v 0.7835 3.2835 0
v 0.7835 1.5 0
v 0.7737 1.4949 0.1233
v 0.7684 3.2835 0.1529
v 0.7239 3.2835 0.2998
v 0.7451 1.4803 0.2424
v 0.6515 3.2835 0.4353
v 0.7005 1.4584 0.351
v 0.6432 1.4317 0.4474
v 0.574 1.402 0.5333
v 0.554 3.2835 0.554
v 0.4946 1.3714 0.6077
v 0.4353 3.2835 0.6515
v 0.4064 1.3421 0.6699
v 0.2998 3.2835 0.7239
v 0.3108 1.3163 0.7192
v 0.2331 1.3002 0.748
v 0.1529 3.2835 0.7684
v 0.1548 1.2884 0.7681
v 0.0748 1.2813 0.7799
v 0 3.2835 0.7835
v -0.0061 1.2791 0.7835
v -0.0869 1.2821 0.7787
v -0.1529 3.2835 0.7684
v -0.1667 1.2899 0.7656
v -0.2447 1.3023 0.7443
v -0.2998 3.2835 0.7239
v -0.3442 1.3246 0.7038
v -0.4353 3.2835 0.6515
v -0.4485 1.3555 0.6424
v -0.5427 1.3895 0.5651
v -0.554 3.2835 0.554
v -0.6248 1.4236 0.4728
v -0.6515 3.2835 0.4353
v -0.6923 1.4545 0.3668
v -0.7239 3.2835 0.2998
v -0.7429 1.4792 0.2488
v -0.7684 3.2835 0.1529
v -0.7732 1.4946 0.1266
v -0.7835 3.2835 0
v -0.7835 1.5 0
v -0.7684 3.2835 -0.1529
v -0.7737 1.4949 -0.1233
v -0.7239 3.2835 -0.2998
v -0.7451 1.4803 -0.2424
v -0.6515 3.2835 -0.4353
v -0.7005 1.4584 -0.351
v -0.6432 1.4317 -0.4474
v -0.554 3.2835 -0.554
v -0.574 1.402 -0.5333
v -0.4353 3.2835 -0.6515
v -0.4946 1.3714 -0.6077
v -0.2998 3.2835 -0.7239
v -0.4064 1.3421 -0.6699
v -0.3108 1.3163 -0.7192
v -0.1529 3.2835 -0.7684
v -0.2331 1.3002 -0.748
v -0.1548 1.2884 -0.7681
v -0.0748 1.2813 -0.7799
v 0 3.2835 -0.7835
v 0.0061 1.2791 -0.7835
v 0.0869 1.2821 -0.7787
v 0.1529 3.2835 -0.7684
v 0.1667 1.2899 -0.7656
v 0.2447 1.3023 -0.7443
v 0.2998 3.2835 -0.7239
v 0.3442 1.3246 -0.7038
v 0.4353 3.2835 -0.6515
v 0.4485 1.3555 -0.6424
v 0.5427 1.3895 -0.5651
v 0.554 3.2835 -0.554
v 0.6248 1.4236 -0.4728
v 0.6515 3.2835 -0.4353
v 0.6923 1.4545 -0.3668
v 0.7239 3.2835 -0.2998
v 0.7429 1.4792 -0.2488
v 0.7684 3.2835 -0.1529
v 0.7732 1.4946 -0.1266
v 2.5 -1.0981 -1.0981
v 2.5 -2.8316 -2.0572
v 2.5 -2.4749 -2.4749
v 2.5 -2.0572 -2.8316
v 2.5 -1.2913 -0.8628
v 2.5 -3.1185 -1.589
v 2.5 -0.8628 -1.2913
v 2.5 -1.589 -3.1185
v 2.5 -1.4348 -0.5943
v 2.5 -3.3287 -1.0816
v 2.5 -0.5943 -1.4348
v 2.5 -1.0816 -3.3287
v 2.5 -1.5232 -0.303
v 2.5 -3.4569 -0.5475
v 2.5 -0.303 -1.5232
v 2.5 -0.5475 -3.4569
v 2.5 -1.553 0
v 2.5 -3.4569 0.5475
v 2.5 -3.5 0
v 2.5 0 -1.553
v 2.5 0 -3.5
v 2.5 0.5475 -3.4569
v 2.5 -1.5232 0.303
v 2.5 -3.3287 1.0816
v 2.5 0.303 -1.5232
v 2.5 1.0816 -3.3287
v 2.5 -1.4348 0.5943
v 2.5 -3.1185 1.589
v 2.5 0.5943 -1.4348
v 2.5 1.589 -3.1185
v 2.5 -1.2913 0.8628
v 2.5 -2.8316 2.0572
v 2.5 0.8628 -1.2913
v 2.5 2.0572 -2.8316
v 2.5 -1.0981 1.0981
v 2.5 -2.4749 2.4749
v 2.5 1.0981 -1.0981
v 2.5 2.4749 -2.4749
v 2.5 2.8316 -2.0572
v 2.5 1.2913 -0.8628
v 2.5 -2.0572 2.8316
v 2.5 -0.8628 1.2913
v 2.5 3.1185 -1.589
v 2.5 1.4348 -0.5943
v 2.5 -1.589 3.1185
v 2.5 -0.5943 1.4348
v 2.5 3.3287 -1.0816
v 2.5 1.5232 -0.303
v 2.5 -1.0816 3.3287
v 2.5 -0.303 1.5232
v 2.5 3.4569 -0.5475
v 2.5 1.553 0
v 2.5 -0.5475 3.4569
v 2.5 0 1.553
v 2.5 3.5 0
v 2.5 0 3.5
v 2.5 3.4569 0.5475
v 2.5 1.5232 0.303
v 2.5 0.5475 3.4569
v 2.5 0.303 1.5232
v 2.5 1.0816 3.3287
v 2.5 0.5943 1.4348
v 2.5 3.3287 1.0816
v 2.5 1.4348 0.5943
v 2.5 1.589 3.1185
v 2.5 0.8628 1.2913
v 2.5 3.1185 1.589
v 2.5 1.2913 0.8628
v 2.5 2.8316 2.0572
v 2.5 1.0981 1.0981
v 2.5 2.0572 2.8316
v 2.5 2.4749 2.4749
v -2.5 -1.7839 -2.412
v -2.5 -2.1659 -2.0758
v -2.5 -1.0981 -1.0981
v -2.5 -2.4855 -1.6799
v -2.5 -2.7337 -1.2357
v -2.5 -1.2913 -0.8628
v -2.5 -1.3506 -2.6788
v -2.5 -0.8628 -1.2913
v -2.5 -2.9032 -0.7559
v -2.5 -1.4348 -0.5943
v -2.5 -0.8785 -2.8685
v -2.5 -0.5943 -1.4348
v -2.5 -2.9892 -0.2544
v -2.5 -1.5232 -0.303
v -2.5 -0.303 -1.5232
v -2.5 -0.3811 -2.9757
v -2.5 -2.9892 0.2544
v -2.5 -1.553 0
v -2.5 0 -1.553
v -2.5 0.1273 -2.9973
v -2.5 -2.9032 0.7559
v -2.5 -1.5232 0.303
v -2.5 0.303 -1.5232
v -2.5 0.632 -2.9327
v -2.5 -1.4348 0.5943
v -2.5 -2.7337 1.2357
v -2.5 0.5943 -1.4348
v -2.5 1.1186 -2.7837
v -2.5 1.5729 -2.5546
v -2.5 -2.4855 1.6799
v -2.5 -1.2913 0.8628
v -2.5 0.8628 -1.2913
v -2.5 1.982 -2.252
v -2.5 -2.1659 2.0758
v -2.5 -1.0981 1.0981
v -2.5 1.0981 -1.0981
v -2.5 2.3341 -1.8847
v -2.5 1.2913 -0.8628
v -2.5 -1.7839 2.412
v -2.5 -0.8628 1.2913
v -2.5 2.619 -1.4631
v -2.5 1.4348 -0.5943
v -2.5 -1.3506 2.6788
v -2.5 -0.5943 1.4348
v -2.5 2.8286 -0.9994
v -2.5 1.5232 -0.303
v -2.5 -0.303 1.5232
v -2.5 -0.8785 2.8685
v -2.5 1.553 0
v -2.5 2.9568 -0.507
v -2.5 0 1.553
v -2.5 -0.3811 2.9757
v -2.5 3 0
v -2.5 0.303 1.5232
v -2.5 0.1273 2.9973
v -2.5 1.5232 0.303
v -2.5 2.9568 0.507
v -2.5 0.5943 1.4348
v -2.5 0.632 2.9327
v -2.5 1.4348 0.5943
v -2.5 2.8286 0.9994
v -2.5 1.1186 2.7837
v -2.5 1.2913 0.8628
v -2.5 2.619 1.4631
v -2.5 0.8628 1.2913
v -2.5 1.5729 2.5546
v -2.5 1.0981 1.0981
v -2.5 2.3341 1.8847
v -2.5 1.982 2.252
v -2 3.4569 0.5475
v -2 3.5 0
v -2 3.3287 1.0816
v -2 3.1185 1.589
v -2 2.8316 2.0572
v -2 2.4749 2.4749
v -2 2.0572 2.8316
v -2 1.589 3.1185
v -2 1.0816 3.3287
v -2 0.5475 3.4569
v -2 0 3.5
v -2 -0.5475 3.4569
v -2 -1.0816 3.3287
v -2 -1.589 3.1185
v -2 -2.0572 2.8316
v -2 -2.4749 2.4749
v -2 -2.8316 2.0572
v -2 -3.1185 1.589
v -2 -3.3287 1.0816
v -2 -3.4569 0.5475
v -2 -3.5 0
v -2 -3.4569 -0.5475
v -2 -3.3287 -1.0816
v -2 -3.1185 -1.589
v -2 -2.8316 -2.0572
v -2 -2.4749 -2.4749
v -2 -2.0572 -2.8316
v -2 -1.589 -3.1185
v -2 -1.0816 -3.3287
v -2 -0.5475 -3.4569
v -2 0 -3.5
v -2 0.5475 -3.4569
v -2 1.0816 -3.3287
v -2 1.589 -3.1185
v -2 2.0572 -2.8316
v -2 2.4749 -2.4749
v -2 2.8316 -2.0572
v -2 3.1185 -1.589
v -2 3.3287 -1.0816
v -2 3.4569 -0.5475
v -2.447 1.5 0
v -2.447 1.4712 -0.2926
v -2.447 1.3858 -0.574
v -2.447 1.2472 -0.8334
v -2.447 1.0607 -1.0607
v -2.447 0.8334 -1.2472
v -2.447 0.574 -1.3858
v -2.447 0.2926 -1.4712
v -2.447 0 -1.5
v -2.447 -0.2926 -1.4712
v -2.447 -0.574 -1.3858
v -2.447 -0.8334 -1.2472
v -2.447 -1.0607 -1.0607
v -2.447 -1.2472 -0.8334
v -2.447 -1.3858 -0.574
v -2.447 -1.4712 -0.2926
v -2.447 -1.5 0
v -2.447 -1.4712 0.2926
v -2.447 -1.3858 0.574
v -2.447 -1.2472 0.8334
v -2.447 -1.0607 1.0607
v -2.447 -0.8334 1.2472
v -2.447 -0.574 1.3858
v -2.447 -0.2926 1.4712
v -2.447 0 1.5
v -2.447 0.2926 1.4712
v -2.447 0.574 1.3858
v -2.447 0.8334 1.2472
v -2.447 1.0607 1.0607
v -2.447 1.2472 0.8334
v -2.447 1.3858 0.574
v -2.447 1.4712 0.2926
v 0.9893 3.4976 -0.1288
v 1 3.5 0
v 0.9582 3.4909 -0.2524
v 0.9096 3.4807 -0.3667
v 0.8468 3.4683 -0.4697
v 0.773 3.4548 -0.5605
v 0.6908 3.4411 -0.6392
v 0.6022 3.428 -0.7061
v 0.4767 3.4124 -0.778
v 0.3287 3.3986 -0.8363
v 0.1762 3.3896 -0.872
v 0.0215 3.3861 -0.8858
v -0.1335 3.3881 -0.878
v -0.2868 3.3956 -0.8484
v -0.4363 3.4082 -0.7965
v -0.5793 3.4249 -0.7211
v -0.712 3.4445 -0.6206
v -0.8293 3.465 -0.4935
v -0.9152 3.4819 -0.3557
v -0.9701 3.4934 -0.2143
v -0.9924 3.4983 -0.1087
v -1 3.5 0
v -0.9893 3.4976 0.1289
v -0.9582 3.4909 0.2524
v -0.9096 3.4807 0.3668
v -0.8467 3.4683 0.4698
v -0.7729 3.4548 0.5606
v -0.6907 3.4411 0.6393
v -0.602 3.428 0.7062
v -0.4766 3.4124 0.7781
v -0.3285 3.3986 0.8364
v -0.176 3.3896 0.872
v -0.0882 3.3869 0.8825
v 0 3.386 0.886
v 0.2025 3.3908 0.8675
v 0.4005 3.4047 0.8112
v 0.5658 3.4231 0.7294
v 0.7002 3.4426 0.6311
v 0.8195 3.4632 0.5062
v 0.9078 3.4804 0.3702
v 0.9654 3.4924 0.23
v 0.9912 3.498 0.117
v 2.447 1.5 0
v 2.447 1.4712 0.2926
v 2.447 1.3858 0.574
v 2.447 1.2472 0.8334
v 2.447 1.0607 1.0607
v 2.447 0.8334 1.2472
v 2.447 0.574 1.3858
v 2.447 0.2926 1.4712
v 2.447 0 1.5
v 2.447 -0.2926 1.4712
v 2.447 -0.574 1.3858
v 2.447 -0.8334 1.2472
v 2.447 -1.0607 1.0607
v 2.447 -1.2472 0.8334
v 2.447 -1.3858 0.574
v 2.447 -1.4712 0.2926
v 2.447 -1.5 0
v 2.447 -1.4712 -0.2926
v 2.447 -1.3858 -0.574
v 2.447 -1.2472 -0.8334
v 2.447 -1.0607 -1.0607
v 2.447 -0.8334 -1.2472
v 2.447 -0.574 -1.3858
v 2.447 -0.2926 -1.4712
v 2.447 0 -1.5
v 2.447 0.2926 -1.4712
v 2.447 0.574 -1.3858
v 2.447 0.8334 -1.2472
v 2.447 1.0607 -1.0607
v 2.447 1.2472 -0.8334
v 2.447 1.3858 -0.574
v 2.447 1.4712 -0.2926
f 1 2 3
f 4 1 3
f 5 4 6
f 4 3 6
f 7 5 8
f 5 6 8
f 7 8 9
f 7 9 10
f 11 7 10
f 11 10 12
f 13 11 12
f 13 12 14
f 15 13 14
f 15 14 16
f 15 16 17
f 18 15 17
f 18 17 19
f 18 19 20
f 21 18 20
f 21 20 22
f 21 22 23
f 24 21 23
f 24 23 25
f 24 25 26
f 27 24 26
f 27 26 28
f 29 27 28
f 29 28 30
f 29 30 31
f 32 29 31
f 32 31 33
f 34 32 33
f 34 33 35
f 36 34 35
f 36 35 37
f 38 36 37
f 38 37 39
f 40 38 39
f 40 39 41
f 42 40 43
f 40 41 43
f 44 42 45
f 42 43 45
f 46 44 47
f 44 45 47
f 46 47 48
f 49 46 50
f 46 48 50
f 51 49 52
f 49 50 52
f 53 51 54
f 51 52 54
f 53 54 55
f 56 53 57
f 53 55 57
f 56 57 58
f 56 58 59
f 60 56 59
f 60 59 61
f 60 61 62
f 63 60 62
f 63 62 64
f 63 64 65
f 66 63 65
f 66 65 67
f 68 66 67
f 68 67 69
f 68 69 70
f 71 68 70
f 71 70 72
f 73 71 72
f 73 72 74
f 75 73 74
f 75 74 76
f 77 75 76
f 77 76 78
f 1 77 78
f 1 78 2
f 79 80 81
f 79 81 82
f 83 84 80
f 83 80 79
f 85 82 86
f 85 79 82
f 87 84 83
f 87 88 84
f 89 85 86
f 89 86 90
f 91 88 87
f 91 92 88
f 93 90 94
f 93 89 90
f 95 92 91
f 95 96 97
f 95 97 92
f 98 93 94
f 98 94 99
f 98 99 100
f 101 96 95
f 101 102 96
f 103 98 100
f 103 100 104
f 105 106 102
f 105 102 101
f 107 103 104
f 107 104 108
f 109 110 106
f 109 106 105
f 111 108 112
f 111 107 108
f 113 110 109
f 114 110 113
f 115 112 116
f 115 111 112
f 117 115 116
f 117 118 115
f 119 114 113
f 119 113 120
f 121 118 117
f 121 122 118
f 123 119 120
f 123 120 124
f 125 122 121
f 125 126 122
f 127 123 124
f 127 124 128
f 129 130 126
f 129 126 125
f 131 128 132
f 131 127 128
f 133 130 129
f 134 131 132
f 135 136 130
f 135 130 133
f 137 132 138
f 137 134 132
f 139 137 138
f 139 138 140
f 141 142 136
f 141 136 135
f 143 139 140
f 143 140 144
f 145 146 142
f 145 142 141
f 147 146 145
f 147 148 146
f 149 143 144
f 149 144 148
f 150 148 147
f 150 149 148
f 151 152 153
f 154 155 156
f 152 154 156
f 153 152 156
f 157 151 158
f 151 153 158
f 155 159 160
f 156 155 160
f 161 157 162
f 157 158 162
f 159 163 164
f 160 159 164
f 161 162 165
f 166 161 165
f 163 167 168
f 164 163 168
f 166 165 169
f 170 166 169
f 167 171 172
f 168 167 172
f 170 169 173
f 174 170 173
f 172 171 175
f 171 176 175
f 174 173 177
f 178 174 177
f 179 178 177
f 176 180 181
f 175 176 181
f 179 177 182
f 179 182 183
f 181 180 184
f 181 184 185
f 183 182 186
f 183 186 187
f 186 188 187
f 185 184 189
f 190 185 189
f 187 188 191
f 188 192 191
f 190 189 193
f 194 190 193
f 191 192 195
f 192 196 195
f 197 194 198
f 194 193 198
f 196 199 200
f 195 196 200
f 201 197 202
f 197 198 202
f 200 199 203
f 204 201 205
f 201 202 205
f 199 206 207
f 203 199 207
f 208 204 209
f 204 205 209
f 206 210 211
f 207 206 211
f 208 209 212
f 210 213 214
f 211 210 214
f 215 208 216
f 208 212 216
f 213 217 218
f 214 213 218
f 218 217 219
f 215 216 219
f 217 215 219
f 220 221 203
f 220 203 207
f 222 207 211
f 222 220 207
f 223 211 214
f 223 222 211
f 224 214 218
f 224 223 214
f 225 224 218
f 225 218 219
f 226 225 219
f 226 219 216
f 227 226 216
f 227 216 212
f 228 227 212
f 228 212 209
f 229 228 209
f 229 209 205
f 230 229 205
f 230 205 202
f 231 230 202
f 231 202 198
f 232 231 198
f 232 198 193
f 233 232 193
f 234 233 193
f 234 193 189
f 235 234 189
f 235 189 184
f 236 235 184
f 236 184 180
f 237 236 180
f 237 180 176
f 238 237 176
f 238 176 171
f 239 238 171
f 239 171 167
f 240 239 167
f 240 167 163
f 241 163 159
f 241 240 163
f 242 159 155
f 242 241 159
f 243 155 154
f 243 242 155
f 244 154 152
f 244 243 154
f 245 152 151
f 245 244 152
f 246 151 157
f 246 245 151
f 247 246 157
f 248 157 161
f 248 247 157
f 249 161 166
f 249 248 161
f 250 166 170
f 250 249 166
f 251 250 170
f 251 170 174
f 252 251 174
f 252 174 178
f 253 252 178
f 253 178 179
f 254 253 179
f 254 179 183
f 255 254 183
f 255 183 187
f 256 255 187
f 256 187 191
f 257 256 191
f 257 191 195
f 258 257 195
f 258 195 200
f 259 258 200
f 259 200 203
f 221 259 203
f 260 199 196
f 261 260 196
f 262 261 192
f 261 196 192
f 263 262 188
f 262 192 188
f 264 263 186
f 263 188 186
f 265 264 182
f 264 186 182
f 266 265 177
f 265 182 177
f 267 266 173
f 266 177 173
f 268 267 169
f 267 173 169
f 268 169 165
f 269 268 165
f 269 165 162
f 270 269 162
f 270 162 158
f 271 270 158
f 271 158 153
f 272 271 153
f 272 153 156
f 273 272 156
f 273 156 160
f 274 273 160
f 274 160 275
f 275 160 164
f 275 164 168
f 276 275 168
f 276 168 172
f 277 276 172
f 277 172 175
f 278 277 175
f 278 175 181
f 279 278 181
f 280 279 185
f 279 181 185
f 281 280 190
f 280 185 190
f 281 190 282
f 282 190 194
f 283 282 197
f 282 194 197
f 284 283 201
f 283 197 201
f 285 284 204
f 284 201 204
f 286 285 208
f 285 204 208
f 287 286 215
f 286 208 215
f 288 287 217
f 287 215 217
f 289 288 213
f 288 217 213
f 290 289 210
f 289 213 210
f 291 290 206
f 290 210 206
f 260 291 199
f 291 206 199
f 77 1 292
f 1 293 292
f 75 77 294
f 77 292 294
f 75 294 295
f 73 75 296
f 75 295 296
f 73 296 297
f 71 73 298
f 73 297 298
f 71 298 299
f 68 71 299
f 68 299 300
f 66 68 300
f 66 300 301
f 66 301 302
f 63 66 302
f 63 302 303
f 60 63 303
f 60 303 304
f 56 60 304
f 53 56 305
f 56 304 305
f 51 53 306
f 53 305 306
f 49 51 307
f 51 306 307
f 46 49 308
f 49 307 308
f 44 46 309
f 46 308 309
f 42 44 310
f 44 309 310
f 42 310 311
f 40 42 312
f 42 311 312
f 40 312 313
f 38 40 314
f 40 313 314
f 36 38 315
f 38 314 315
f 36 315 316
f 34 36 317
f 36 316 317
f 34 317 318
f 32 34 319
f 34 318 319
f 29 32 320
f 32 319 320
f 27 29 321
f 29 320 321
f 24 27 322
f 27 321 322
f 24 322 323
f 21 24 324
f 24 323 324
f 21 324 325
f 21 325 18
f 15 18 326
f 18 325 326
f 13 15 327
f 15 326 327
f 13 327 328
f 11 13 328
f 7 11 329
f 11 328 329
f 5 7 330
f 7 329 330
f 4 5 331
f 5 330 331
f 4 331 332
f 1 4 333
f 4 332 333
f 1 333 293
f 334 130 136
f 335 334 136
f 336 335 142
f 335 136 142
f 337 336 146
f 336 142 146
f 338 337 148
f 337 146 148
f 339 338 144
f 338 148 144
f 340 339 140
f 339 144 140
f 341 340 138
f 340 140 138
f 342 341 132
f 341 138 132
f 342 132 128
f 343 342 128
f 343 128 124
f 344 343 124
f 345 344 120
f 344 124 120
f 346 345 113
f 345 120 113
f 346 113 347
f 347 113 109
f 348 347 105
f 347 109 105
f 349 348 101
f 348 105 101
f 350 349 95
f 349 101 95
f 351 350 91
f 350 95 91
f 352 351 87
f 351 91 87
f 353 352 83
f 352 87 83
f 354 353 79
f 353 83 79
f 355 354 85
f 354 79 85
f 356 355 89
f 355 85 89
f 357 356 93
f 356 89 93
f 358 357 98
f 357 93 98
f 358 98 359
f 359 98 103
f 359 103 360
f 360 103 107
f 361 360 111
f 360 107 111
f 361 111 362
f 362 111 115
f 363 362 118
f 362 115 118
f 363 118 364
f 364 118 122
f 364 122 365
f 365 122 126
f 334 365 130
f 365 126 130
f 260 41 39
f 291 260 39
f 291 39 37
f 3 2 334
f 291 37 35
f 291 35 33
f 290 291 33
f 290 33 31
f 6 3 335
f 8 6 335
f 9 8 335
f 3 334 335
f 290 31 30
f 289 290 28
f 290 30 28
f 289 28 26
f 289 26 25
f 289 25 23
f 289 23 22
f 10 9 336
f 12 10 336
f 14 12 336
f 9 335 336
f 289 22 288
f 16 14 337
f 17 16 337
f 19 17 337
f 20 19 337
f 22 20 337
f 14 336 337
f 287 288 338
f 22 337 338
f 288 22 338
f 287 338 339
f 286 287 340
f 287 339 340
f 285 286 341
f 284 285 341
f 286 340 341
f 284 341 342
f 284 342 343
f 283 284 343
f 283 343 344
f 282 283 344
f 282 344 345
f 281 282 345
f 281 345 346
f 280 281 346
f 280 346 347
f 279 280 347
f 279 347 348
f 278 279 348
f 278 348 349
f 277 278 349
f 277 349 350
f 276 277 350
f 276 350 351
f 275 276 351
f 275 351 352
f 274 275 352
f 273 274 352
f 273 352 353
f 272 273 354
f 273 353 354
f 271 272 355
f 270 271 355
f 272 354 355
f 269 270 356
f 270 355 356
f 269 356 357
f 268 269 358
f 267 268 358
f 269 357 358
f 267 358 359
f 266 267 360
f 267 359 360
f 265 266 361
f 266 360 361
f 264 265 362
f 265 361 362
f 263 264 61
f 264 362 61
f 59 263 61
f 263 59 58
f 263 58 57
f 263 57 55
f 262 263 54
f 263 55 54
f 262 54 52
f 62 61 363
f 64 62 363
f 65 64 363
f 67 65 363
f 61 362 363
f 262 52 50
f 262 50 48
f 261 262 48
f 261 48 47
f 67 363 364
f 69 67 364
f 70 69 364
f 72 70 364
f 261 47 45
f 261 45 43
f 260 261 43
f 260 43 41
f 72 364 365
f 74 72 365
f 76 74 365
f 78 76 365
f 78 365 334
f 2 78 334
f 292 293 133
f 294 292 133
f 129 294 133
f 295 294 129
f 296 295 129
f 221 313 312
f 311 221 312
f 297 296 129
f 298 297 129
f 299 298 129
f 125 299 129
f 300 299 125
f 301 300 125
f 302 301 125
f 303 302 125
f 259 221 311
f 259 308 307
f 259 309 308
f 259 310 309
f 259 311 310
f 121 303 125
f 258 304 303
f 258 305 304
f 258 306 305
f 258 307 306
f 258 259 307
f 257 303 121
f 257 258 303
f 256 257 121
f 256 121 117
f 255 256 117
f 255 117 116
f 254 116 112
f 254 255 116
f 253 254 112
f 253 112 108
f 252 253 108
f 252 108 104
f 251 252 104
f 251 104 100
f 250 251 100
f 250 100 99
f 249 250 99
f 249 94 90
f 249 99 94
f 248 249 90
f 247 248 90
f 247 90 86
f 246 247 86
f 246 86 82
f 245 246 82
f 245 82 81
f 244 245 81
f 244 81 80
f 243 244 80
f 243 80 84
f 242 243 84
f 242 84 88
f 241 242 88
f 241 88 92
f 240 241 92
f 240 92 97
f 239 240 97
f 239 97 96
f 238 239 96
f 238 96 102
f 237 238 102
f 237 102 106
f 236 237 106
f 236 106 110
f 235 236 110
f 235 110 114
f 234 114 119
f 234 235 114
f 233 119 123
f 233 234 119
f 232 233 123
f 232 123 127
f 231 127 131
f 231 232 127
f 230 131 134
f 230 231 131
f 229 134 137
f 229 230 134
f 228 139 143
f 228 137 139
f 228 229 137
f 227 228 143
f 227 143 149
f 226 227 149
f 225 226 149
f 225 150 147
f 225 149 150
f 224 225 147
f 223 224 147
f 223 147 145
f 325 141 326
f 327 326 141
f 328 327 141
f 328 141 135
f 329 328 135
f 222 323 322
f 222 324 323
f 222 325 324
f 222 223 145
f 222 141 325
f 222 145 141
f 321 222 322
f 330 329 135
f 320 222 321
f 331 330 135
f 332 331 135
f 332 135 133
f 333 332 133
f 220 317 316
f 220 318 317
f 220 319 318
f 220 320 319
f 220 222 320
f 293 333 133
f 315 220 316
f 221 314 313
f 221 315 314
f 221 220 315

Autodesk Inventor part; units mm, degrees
sketch "Skizze_1" plane through (0, 0, 0) normal (0, 0, 1) x (1, 0, 0)
  line L0 (2.5, 0) -> (-2.5, 0)
  line L1 (-2.5, 3) -> (-2.5, 1.553)
  line L2 (-2.5, 1.553) -> (-2.447, 1.5)
  line L3 (-2.447, 1.5) -> (2.447, 1.5)
  line L4 (2.447, 1.5) -> (2.5, 1.553)
  line L5 (2.5, 1.553) -> (2.5, 3.5)
  line L6 (2.5, 3.5) -> (-2, 3.5)
  line L7 (-2, 3.5) -> (-2.5, 3)
revolve "Revolution1" add sketch "Skizze_1" angle 360 about axis through (2.5, 0, 0) along (1, 0, 0)
sketch "Skizze_2" plane through (0, 0, 0) normal (0, 0, 1) x (1, 0, 0)
  line L0 (0, 0.75) -> (0, 3.5)
  line L1 (0, 3.5) -> (1, 3.5)
  line L2 (1, 3.5) -> (0.7835, 3.2835)
  line L3 (0.7835, 3.2835) -> (0.7835, 0.9665)
  line L4 (0.7835, 0.9665) -> (1, 0.75)
  line L5 (1, 0.75) -> (0, 0.75)
  line L6 (0, 0.75) -> (0, 3.5)
revolve "Revolution2" cut sketch "Skizze_2" angle 360 about axis through (0, 0.75, 0) along (0, -1, 0)
thread "Thread1" size "M2x0.4" class "6H" standard "ISO Metric profile" full length
ref_plane "gst_nr_1_XY" through (0, 3.5, 0) normal (0, 1, 0) x (1, 0, 0)
ref_plane "gst_nr_1_YZ" through (0, 3.5, 0) normal (1, 0, 0) x (0, 0, -1)
ref_plane "gst_nr_1_ZX" through (0, 3.5, 0) normal (0, 0, -1) x (0, 1, 0)
properties part number "623890036_1"
